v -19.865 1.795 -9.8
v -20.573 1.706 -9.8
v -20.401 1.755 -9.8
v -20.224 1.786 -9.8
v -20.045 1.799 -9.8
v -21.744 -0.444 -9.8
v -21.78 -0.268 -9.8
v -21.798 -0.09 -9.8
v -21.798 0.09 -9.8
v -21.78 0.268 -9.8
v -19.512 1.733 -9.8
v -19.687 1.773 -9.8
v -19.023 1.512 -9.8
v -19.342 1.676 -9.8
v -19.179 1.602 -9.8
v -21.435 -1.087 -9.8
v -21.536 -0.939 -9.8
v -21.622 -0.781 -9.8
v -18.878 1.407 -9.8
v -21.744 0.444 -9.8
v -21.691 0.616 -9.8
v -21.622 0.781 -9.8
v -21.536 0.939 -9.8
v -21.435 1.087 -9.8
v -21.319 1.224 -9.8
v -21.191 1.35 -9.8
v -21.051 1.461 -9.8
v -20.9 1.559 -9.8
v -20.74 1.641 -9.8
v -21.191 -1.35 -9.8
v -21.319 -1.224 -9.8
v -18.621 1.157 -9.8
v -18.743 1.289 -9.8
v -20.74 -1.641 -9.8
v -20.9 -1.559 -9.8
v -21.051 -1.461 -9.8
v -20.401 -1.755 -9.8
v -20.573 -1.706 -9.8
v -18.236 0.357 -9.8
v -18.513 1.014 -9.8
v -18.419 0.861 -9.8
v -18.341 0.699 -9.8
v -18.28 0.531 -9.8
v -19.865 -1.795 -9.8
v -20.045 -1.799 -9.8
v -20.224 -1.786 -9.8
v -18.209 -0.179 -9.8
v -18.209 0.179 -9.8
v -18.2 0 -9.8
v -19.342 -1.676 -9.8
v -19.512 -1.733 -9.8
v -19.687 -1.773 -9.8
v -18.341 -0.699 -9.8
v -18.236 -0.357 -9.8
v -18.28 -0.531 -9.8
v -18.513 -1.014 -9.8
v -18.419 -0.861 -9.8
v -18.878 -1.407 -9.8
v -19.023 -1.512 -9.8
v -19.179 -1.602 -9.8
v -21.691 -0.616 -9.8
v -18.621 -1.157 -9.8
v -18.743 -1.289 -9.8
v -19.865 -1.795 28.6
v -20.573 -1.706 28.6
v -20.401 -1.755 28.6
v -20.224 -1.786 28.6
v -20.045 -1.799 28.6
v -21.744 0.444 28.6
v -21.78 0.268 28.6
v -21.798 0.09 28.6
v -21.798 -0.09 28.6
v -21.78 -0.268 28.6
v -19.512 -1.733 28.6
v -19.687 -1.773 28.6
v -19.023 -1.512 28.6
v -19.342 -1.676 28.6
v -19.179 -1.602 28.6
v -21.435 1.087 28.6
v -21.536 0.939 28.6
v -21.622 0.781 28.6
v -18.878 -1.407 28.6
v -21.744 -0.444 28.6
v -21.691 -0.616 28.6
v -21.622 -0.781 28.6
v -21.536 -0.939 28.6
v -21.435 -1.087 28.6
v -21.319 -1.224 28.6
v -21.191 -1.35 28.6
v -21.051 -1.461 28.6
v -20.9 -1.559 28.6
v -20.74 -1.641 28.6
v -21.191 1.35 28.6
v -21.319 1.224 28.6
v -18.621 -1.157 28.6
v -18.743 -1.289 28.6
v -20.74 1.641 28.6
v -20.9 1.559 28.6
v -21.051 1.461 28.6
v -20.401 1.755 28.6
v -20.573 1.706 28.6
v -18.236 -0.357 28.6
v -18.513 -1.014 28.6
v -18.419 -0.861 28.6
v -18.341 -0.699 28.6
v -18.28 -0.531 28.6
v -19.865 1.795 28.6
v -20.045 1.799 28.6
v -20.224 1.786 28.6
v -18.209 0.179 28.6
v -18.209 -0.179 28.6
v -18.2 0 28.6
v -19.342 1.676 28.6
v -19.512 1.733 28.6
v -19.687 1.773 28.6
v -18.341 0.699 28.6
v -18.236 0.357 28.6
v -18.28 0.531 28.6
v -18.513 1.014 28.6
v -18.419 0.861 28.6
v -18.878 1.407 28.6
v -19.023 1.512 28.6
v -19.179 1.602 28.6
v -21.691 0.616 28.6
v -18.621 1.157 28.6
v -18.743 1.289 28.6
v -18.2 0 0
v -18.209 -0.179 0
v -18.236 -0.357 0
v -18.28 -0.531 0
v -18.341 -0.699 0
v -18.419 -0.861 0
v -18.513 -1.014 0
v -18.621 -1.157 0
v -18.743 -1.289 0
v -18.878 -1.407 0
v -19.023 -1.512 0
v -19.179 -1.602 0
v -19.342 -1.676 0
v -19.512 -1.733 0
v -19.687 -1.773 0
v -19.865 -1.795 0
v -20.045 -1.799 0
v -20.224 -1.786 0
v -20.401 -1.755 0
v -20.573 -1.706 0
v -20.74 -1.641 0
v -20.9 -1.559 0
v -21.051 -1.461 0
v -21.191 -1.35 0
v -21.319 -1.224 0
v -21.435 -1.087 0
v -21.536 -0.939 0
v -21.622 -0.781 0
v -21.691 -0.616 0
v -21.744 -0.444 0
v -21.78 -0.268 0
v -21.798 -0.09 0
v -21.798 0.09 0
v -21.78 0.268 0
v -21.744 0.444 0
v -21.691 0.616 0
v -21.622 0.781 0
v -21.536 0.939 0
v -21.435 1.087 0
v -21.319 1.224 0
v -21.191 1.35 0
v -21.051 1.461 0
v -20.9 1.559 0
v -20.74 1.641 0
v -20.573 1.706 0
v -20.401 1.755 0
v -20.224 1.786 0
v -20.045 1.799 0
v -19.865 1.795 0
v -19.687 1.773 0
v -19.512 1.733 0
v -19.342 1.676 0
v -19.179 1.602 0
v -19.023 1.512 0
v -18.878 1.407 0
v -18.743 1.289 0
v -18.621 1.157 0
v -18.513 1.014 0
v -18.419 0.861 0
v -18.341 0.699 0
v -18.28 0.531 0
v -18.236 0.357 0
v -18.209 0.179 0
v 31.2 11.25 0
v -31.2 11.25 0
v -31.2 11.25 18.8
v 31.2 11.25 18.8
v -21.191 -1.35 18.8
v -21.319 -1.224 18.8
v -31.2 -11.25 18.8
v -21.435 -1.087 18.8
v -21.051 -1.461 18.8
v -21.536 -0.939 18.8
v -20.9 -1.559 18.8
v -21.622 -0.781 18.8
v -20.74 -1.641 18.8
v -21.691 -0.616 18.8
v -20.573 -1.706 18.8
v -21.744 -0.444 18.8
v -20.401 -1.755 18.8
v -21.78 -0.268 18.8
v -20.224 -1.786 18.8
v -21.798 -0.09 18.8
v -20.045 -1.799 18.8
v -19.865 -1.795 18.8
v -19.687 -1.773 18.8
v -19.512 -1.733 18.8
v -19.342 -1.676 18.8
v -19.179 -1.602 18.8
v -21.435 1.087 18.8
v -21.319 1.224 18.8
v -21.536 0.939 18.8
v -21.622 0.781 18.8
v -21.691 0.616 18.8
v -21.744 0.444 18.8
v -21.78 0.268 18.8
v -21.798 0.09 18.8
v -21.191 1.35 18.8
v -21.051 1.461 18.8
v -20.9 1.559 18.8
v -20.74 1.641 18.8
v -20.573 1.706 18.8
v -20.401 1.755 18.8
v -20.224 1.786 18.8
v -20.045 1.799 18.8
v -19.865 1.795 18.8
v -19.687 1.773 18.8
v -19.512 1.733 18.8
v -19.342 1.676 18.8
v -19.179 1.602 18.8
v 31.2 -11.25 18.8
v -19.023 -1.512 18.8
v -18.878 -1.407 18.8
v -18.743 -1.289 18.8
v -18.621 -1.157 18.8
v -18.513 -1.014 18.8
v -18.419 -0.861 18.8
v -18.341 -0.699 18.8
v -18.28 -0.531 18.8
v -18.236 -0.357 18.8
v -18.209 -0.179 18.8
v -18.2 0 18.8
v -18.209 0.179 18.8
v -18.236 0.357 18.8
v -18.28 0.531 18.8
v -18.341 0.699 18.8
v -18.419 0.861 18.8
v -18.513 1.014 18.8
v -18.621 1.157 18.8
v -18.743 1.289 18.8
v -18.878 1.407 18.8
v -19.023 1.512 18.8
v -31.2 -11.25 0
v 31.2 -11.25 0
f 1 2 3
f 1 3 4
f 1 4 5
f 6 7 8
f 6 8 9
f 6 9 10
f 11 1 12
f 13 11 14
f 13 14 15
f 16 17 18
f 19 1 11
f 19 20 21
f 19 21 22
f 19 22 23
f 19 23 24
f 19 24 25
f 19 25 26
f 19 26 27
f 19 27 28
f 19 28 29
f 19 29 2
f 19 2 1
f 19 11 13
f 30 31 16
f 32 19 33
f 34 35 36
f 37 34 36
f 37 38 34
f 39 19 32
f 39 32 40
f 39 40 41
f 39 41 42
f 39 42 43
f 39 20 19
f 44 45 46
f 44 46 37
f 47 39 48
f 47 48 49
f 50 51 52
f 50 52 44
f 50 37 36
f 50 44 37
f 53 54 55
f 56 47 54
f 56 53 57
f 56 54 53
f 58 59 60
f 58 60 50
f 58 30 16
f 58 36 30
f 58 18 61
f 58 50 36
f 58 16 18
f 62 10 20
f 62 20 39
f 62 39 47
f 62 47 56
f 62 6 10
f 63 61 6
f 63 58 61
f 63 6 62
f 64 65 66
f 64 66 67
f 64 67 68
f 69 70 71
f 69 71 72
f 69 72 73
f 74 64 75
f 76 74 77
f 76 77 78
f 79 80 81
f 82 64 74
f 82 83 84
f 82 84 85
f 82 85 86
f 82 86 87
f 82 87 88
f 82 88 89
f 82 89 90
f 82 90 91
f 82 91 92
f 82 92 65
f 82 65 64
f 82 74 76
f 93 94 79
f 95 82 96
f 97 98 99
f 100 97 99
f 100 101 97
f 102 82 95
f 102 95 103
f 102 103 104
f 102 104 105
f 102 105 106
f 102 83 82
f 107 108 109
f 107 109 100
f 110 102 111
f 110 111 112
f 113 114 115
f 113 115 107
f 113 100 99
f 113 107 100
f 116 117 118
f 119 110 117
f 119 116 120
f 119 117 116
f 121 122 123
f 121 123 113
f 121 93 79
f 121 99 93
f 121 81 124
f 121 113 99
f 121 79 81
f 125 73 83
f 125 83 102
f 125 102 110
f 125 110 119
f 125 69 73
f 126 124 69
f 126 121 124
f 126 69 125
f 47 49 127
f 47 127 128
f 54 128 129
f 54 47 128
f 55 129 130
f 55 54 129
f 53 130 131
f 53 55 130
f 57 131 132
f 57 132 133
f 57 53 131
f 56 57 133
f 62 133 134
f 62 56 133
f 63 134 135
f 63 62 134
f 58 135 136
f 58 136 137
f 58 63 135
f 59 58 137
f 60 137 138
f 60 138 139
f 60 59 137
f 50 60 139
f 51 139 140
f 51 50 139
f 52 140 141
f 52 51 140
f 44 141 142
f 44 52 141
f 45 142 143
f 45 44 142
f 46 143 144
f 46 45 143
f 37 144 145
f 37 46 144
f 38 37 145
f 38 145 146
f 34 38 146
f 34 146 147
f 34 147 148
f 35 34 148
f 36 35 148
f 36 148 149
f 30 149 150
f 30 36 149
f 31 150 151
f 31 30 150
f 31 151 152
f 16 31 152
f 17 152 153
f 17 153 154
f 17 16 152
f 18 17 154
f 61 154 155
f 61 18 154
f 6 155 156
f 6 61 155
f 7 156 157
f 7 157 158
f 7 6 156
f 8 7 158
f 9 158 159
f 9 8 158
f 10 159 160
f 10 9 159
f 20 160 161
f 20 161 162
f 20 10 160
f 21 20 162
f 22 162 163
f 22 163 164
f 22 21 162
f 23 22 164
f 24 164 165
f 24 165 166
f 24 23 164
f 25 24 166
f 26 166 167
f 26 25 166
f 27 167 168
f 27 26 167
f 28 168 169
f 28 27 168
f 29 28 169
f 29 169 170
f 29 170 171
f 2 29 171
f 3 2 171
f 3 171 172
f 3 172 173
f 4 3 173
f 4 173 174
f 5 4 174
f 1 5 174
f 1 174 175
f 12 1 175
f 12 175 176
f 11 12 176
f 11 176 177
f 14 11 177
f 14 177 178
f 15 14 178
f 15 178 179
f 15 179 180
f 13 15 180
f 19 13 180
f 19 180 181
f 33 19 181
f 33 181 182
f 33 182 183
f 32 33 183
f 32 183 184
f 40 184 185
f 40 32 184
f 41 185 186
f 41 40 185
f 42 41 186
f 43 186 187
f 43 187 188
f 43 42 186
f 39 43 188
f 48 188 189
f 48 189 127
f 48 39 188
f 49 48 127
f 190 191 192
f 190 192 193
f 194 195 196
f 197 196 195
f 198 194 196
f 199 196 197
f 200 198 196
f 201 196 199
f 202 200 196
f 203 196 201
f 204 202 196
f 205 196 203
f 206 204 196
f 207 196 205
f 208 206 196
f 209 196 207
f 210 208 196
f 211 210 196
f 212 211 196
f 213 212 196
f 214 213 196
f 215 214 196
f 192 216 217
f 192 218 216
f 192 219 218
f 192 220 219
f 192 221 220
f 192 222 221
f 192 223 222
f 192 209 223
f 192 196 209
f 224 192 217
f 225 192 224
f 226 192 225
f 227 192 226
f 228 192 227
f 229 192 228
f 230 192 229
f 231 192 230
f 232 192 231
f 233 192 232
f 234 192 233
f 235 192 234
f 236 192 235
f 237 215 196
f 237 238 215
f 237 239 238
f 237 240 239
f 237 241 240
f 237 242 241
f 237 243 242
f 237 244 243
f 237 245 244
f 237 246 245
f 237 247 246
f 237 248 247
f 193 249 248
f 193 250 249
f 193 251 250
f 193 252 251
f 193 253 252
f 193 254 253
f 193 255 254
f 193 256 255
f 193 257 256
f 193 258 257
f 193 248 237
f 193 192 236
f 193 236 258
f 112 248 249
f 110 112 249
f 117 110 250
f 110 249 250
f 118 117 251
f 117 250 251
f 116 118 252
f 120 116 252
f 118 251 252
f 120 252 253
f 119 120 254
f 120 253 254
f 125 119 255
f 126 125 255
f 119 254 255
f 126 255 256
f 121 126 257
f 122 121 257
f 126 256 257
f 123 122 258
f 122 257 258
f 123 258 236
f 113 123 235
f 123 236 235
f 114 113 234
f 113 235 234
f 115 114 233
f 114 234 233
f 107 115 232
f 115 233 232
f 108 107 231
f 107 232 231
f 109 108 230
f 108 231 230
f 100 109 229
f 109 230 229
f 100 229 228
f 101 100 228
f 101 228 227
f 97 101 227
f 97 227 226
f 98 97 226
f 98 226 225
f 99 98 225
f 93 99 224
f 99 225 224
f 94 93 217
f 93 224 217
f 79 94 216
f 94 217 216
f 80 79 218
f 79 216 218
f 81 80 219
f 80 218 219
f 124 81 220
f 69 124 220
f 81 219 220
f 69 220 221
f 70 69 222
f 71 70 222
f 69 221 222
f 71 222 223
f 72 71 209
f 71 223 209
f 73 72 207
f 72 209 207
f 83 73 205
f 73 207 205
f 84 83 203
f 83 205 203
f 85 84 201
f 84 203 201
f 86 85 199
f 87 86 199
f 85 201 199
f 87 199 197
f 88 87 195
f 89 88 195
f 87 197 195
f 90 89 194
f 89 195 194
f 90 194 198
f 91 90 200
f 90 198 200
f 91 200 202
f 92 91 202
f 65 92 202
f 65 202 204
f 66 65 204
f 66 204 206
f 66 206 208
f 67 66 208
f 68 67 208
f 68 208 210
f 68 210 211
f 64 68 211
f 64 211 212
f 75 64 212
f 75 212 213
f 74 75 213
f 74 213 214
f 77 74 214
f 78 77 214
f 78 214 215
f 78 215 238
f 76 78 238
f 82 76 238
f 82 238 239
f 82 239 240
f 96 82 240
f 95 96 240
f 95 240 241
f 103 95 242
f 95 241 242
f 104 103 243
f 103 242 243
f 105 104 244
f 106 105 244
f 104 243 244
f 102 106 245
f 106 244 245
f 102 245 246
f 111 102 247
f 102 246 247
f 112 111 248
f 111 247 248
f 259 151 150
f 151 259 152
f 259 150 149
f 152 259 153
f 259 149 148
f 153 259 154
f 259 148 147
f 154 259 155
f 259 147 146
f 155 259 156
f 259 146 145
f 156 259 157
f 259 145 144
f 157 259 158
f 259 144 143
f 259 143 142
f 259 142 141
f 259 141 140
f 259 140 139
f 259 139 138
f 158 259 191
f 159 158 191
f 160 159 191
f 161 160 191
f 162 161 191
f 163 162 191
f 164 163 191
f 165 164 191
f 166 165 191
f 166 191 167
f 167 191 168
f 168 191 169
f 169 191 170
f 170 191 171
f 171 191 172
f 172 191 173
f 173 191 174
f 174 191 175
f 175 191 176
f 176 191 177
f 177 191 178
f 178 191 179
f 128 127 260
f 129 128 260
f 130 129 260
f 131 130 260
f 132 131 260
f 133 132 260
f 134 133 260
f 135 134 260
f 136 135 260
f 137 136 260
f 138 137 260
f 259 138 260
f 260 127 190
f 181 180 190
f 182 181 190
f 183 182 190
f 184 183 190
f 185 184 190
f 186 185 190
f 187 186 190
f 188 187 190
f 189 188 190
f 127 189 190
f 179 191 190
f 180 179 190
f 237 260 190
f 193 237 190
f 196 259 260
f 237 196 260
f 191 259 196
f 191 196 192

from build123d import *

# Parameters (mm, degrees)
SKETCH1_W           = 62.4
SKETCH1_H           = 22.5
BOSS_EXTRUDE1_DEPTH = 18.8
SKETCH2_R           = 1.8
BOSS_EXTRUDE2_DEPTH = 9.8
BOSS_EXTRUDE3_START = 9.8
SKETCH3_R           = 1.8
BOSS_EXTRUDE3_DEPTH = 9.8


with BuildPart() as part:
    # Sketch1 → Boss-Extrude1 (new body)
    with BuildSketch(Plane.XY):
        Rectangle(SKETCH1_W, SKETCH1_H)
    extrude(amount=BOSS_EXTRUDE1_DEPTH)

    # Sketch2 → Boss-Extrude2 (add)
    with BuildSketch(Plane.XY.offset(18.8)):
        with Locations((-20, 0)):
            Circle(SKETCH2_R)
    extrude(amount=BOSS_EXTRUDE2_DEPTH)

    # Sketch3 → Boss-Extrude3 (add)
    with BuildSketch(Plane(origin=(0, 0, 0), x_dir=(-1, 0, 0), z_dir=(0, 0, -1)).offset(BOSS_EXTRUDE3_START)):
        with Locations(Location((20, 0, 0), (0, 0, 180))):
            Circle(SKETCH3_R)
    extrude(amount=-BOSS_EXTRUDE3_DEPTH)


solid = part.part
